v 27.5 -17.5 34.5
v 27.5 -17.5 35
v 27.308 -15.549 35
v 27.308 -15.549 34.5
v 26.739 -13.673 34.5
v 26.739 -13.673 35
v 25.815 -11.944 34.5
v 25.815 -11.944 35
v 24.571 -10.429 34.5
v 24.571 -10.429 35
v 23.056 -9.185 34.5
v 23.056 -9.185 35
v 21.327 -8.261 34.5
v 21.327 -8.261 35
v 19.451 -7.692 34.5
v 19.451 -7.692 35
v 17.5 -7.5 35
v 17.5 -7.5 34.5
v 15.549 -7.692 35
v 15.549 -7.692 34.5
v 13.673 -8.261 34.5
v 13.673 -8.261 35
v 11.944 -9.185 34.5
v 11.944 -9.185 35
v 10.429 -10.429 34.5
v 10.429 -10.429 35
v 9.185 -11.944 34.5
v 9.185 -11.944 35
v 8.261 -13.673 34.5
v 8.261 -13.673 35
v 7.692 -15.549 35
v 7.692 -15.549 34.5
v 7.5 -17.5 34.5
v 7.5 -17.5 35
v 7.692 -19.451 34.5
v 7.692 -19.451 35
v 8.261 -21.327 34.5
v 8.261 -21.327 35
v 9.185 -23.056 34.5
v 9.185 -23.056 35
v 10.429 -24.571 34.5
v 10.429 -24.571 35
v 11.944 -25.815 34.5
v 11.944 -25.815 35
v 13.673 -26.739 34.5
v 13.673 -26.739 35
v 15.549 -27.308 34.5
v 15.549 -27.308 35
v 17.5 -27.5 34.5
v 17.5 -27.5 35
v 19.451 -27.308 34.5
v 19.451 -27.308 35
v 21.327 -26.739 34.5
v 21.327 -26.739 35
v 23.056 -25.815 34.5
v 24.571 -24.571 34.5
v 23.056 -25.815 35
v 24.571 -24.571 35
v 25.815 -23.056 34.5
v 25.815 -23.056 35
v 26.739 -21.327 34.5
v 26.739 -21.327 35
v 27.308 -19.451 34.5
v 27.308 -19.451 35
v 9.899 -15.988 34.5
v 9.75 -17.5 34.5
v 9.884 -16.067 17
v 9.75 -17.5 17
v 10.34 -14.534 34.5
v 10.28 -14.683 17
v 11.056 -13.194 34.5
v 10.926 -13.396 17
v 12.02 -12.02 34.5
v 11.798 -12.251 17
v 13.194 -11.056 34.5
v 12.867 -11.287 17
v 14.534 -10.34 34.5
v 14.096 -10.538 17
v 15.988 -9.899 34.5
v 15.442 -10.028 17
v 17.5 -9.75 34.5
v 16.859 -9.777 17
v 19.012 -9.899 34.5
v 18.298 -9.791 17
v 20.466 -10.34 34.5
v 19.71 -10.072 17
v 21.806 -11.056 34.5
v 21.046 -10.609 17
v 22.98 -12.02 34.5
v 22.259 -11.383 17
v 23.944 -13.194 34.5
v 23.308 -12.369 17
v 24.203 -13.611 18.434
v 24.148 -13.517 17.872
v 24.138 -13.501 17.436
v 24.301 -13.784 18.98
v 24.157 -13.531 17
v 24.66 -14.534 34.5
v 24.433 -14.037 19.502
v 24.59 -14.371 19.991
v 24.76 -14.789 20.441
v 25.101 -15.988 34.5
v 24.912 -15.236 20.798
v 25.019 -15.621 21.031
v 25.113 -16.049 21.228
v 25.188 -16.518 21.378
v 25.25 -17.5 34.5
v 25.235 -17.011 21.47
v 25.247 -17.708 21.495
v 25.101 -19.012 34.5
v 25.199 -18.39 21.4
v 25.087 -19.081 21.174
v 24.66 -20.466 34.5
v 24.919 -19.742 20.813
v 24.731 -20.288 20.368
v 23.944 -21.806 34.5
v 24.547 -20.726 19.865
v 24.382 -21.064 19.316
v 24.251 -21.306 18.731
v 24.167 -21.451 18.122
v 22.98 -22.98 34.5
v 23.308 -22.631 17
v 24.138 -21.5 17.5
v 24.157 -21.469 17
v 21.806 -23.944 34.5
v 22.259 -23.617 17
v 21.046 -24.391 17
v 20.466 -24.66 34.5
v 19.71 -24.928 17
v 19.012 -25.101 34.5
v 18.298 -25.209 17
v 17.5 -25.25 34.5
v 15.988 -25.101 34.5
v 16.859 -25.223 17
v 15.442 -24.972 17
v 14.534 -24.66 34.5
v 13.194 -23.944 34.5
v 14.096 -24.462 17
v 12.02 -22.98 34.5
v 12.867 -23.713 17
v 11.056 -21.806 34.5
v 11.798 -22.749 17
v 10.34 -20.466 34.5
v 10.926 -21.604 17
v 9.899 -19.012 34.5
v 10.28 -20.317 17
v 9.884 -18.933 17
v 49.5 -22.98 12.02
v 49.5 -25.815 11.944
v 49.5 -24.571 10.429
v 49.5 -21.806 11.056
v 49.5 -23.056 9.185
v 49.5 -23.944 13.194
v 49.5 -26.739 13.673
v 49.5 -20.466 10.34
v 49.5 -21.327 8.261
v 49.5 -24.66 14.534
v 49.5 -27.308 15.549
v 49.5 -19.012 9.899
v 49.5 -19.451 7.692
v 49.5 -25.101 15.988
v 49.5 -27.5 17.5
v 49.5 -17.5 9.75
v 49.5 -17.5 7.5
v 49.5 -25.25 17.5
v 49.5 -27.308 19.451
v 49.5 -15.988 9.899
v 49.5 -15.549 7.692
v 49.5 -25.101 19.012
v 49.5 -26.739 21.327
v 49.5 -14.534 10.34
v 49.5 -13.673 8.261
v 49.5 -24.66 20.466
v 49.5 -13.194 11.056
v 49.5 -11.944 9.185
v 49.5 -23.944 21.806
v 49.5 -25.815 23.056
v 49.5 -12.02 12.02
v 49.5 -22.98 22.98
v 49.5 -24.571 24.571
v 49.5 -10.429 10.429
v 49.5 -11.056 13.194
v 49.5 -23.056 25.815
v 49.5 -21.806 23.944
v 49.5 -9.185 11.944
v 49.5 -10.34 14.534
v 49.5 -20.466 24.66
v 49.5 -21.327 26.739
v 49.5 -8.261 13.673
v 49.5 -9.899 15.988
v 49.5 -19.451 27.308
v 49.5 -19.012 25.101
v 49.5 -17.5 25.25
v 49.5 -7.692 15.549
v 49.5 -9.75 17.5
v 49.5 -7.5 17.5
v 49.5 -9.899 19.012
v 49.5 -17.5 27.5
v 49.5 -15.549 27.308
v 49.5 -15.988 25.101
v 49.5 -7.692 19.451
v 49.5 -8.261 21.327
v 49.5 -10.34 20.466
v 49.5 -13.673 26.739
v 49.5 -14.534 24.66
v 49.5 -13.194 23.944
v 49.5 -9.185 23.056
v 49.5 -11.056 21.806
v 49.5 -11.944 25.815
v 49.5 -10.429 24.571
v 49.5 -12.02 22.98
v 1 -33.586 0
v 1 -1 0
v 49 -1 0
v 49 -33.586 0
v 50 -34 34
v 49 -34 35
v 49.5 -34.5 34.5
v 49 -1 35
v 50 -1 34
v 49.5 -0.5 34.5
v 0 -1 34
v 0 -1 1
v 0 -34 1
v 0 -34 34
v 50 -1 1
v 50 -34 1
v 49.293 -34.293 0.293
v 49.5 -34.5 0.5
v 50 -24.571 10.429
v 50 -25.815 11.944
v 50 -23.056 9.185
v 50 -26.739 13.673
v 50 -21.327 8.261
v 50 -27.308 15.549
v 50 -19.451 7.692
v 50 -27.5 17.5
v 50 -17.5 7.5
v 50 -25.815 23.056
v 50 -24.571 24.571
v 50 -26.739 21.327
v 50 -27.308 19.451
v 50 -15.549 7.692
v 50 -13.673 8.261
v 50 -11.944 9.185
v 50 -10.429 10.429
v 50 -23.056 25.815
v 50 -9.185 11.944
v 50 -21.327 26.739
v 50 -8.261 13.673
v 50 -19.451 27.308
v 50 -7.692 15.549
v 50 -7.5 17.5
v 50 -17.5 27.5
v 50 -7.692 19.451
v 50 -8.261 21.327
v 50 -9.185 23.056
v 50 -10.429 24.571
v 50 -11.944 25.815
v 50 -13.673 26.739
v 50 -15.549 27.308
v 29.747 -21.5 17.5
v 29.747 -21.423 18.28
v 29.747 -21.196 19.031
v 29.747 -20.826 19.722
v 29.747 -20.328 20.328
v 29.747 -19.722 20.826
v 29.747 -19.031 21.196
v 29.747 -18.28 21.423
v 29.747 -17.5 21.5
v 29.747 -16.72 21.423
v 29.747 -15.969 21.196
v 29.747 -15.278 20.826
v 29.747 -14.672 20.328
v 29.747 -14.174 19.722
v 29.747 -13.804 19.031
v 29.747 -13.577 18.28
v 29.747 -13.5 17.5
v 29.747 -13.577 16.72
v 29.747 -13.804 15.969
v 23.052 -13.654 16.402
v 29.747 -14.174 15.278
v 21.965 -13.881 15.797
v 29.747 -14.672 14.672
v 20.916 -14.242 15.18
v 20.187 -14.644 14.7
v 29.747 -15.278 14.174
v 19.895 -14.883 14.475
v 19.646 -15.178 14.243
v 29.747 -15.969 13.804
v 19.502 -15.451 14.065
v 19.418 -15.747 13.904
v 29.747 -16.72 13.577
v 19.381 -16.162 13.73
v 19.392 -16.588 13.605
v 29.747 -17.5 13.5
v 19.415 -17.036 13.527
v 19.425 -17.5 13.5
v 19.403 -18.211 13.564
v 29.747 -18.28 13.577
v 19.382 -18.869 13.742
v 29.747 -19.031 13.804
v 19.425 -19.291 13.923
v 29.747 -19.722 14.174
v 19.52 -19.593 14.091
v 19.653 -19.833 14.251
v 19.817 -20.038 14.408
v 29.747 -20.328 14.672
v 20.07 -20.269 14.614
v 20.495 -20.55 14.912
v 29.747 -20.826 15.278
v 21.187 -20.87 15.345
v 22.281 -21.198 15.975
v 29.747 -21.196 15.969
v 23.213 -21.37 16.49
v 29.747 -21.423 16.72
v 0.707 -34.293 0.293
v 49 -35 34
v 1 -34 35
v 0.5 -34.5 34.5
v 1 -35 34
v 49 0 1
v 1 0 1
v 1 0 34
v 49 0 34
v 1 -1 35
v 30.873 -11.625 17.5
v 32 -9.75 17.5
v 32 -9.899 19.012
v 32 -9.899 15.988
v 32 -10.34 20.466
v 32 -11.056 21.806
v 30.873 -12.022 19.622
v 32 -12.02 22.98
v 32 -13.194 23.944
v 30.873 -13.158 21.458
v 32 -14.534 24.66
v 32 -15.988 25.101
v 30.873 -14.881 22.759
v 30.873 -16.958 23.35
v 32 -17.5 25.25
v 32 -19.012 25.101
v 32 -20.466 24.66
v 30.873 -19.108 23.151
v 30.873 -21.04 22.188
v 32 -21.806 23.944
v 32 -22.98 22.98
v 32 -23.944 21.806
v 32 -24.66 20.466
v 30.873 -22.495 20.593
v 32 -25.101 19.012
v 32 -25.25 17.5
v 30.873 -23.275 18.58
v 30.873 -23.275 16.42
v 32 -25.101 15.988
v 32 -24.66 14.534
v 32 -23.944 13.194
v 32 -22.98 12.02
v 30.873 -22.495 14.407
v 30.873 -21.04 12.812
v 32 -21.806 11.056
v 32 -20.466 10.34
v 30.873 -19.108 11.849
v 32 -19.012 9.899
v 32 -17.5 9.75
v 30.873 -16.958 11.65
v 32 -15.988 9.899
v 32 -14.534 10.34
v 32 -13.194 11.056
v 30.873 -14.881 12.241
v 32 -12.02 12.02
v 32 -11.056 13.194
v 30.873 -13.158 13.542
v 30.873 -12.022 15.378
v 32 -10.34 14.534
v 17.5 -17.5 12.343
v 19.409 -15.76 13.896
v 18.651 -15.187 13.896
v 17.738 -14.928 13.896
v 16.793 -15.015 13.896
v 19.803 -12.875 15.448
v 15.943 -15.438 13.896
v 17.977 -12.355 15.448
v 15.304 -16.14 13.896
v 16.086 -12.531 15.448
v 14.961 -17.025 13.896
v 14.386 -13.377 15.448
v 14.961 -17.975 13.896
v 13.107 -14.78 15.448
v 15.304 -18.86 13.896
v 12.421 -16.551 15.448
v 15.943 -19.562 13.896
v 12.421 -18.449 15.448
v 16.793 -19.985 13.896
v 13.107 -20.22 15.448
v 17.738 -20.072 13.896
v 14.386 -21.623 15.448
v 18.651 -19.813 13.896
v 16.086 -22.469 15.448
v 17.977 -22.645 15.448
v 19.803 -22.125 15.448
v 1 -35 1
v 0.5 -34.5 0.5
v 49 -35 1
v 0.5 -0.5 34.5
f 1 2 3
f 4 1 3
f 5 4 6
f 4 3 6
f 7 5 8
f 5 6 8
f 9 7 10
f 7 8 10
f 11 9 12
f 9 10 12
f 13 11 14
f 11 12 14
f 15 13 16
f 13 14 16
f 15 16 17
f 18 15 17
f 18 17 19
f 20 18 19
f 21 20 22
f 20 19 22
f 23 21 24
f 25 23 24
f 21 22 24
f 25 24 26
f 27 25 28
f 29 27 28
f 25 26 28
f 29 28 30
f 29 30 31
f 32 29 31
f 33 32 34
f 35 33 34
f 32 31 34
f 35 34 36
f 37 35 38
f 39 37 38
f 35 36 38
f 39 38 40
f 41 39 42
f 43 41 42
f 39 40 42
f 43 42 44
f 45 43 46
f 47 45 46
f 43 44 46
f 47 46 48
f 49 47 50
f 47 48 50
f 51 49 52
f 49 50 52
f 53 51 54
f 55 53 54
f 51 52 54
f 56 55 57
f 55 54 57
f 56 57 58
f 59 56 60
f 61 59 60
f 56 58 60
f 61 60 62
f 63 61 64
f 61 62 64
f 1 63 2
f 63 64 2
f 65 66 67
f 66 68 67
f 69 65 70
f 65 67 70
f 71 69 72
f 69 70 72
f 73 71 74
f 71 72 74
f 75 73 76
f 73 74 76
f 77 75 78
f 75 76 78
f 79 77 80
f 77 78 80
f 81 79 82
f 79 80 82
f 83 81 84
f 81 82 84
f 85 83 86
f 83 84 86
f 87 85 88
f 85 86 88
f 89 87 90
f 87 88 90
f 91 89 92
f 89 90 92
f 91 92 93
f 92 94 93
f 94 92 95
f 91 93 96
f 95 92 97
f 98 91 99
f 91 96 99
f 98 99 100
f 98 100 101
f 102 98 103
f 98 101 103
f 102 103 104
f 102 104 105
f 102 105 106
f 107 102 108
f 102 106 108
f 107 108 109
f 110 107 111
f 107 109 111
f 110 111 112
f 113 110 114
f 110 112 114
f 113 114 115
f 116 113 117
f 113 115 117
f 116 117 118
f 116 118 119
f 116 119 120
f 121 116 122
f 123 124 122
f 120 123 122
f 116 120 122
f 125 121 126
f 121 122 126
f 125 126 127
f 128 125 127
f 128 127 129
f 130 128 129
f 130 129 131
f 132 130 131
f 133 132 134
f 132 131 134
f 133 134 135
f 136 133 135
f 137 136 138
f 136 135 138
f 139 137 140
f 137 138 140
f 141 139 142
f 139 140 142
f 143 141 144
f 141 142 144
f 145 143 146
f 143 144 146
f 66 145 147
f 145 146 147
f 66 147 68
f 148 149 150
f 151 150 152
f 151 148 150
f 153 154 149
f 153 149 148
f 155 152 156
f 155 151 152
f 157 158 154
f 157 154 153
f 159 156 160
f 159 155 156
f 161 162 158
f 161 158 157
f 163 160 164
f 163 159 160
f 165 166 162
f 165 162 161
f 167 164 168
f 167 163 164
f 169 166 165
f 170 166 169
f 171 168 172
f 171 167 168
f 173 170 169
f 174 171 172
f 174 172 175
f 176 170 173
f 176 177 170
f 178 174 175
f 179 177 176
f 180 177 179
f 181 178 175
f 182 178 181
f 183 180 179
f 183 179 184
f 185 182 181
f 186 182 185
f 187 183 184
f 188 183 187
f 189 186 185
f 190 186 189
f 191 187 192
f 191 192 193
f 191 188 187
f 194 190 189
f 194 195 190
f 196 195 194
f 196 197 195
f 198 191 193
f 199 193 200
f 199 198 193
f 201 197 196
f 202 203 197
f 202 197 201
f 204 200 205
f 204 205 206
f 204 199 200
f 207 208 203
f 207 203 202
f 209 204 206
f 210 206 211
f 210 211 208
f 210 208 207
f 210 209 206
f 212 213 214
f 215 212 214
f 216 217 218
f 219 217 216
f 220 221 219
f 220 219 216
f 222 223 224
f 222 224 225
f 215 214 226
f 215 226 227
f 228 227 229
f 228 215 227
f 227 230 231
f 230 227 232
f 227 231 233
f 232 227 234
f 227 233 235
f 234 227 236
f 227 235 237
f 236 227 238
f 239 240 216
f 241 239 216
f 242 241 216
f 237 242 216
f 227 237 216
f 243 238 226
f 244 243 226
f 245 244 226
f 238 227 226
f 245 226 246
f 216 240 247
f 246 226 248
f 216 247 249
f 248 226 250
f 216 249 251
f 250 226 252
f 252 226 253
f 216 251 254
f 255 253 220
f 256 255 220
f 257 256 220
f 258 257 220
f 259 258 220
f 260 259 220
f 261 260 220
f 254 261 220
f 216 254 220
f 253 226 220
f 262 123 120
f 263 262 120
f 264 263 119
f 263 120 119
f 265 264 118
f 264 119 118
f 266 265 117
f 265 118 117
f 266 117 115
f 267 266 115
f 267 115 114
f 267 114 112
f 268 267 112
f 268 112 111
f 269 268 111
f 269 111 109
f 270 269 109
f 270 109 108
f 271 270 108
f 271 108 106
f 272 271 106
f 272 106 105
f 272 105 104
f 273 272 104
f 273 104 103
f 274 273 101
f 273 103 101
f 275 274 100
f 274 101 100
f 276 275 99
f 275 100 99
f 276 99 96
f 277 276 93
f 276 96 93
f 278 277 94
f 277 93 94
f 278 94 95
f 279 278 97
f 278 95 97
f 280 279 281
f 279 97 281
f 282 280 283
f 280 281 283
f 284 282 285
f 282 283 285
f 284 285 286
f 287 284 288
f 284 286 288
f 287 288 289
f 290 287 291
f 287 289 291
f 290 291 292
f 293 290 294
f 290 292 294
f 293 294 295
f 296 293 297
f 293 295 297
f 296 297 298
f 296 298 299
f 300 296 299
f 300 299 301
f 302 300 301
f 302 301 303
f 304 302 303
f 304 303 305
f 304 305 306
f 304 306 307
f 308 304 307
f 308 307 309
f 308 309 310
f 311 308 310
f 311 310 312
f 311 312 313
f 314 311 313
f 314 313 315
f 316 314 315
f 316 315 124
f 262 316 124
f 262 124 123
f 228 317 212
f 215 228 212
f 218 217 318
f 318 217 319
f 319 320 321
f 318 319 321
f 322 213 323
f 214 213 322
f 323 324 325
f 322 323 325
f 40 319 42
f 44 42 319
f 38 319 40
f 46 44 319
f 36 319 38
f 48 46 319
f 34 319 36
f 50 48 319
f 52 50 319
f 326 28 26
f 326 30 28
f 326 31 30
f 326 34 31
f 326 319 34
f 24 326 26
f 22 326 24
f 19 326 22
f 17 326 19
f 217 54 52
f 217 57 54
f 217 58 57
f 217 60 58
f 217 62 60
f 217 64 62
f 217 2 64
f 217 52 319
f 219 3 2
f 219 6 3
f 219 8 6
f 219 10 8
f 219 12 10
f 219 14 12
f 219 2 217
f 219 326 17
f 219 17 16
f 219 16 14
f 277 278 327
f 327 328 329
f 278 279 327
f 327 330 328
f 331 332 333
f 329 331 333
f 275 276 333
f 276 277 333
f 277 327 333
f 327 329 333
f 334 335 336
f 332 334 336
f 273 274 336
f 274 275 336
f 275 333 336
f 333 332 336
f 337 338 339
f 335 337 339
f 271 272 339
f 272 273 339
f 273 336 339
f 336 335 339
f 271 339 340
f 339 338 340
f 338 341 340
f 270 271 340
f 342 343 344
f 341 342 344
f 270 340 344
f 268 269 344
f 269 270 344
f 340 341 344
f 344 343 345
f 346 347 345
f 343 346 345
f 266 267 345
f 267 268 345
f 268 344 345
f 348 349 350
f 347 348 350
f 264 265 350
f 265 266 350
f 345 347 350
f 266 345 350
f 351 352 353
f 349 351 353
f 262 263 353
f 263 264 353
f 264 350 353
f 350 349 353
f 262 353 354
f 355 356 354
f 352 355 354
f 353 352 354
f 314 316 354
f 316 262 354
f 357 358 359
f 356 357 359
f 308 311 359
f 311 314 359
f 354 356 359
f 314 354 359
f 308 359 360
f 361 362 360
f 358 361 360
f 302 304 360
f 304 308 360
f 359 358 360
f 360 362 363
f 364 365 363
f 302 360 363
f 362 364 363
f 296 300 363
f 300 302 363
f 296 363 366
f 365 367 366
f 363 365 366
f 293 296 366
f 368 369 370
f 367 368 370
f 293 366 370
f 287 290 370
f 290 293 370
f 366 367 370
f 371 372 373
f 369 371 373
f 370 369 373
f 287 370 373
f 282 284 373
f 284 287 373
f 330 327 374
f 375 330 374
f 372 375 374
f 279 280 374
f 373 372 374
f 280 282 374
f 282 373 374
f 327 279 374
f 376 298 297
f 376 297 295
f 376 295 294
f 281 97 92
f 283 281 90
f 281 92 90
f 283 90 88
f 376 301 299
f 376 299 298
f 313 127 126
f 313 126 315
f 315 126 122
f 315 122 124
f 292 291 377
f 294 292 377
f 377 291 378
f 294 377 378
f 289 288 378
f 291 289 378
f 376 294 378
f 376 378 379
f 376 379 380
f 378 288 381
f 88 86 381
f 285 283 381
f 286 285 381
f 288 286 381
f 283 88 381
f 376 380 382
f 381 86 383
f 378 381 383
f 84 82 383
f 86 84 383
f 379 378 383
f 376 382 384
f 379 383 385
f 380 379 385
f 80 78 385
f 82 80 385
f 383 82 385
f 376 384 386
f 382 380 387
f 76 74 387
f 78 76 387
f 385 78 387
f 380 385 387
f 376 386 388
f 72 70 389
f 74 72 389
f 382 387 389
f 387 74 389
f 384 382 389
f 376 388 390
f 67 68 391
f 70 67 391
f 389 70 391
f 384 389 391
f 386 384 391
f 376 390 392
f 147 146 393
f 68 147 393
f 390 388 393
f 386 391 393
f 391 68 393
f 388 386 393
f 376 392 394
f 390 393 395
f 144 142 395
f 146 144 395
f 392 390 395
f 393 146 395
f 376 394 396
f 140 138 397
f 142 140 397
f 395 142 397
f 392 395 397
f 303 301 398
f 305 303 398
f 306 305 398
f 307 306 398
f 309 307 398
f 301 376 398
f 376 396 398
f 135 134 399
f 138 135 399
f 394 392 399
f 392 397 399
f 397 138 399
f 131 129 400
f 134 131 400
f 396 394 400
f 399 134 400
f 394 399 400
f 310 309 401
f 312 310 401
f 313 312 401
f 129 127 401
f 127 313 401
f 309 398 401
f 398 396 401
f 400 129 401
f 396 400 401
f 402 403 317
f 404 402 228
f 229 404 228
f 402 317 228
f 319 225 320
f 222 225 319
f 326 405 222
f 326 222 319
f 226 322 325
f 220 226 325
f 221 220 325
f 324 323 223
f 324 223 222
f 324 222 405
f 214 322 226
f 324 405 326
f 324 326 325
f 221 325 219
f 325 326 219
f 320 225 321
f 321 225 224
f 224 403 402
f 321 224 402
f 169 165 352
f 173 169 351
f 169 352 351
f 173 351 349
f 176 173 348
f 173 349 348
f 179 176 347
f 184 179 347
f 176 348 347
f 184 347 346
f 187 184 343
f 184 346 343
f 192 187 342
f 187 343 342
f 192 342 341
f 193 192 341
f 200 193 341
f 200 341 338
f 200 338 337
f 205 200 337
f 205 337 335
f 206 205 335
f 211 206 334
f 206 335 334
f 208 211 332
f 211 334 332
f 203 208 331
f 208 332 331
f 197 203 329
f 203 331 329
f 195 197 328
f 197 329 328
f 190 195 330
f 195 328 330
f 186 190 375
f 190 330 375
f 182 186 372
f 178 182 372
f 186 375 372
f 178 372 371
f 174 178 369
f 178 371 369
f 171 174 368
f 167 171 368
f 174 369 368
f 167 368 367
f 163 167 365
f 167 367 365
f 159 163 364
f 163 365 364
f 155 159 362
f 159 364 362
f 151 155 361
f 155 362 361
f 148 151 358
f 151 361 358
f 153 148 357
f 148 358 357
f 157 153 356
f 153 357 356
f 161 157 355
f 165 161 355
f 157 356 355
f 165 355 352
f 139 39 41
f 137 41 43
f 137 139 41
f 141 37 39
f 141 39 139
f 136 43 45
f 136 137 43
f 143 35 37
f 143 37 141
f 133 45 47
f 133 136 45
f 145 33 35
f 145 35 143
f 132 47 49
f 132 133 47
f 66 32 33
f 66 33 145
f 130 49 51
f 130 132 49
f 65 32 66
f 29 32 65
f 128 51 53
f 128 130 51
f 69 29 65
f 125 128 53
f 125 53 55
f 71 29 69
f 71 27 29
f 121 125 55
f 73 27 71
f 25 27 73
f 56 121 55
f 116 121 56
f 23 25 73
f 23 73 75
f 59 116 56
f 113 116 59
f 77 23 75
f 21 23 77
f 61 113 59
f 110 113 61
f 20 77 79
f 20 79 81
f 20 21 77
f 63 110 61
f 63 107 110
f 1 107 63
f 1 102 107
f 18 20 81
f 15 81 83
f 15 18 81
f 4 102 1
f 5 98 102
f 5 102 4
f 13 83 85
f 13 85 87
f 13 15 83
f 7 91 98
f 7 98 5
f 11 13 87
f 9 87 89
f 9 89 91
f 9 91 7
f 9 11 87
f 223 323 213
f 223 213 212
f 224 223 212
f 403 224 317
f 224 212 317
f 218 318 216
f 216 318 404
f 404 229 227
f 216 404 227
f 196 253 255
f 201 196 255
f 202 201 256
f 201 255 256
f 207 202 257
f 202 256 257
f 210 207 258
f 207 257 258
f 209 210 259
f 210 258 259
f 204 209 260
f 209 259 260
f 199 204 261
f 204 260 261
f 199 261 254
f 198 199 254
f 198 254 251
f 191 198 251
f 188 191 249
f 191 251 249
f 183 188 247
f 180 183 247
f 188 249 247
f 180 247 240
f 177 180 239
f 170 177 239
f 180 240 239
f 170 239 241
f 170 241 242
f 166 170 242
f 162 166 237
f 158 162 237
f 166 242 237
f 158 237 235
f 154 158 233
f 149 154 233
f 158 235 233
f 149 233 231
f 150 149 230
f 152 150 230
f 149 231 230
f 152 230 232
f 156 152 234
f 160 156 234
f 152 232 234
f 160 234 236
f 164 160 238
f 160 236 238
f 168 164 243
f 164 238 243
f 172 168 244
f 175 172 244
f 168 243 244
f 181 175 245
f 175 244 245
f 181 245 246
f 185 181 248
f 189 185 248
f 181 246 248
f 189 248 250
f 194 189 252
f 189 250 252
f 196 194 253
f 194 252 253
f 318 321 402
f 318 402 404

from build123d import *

# Parameters (mm, degrees)
F0_W         = 50
F0_H         = 35
F1_DEPTH     = 35
F3_D         = 15.5
F3_DEPTH     = 18
F3_TIP       = 4.6566697975
F5_D         = 15.5
F5_DEPTH     = 18
F5_TIP       = 4.6566697975
F7_D         = 8
F7_DEPTH     = 33
F7_TIP       = 2.4034424761
F8_R         = 10
F8_R_2       = 7.75
F9_DEPTH     = 0.5
F10_R        = 10
F10_R_2      = 7.75
F11_DEPTH    = 0.5
F13_SIZE     = 1
F14_T1_DEPTH = 39.1433659759
F14_T3_DEPTH = 39.1433659759
F14_T5_DEPTH = 55.1433659759
F14_T7_DEPTH = 50.2571417204


# Not quite as in the source:
# - a fillet or chamfer that OpenCascade refuses, or shapes differently, is made with other operations: its cross-section is extruded or revolved along the edge and cut away or added
# - a feature of the source that left no trace in its solid (it failed there, or was rolled back) is left out


with BuildPart() as f1:
    # F0 (on Front) → F1 (new body)
    with BuildSketch(Plane.XZ):
        with Locations((25, 17.5)):
            Rectangle(F0_W, F0_H)
    extrude(amount=F1_DEPTH)

    # F3
    with Locations(Plane.YZ.offset(50)):
        with Locations((-17.5, 17.5)):
            Hole(F3_D / 2, depth=F3_DEPTH)
            with Locations((0, 0, -(F3_DEPTH + F3_TIP / 2))):  # 118° drill point
                Cone(0, F3_D / 2, F3_TIP, mode=Mode.SUBTRACT)

    # F5
    with Locations(Plane.XY.offset(35)):
        with Locations((17.5, -17.5)):
            Hole(F5_D / 2, depth=F5_DEPTH)
            with Locations((0, 0, -(F5_DEPTH + F5_TIP / 2))):  # 118° drill point
                Cone(0, F5_D / 2, F5_TIP, mode=Mode.SUBTRACT)

    # F7
    with Locations(Plane.YZ.offset(50)):
        with Locations((-17.5, 17.5)):
            Hole(F7_D / 2, depth=F7_DEPTH)
            with Locations((0, 0, -(F7_DEPTH + F7_TIP / 2))):  # 118° drill point
                Cone(0, F7_D / 2, F7_TIP, mode=Mode.SUBTRACT)

    # F8 (on face) → F9 (cut)
    with BuildSketch(Plane.YZ.offset(50)):
        with Locations((-17.5, 17.5)):
            Circle(F8_R)
        with Locations((-17.5, 17.5)):
            Circle(F8_R_2, mode=Mode.SUBTRACT)
    extrude(amount=-F9_DEPTH, mode=Mode.SUBTRACT)

    # F10 (on face) → F11 (cut)
    with BuildSketch(Plane.XY.offset(35)):
        with Locations((17.5, -17.5)):
            Circle(F10_R)
        with Locations((17.5, -17.5)):
            Circle(F10_R_2, mode=Mode.SUBTRACT)
    extrude(amount=-F11_DEPTH, mode=Mode.SUBTRACT)

    # F13
    f13_edges = [f1.edges().sort_by_distance(p)[0] for p in [
        (0, 0, 17.5),
        (25, 0, 0),
        (50, 0, 17.5),
        (25, 0, 35),
        (0, -17.5, 0),
        (50, -17.5, 0),
        (25, -35, 0),
    ]]
    chamfer(f13_edges, length=F13_SIZE)

    # F14: chamfer of 1 on 6 edges, made by hand

    # F14_s2 → F14_t1 (cut)
    with BuildSketch(Plane.XZ.offset(-1.571682988)):
        Polygon((0, 34), (1, 35), (0, 35), align=None)
        Polygon((49, 35), (50, 34), (50, 35), align=None)
    extrude(amount=F14_T1_DEPTH, mode=Mode.SUBTRACT)

    # F14_s4 → F14_t3 (cut)
    with BuildSketch(Plane.XY.offset(-1.571682988)):
        Polygon((0, -34), (1, -35), (0, -35), align=None)
        Polygon((49, -35), (50, -34), (50, -35), align=None)
    extrude(amount=F14_T3_DEPTH, mode=Mode.SUBTRACT)

    # F14_s6 → F14_t5 (cut)
    with BuildSketch(Plane.YZ.offset(-2.571682988)):
        Polygon((-34, 35), (-35, 34), (-35, 35), align=None)
    extrude(amount=F14_T5_DEPTH, mode=Mode.SUBTRACT)

    # F14_s8 → F14_t7 (cut)
    with BuildSketch(Plane.YZ.offset(-0.1285708602)):
        Polygon((-34.2928932188, 0.2928932188), (-33.5857864376, 0), (-34, 0), align=None)
    extrude(amount=F14_T7_DEPTH, mode=Mode.SUBTRACT)


solid = f1.part
